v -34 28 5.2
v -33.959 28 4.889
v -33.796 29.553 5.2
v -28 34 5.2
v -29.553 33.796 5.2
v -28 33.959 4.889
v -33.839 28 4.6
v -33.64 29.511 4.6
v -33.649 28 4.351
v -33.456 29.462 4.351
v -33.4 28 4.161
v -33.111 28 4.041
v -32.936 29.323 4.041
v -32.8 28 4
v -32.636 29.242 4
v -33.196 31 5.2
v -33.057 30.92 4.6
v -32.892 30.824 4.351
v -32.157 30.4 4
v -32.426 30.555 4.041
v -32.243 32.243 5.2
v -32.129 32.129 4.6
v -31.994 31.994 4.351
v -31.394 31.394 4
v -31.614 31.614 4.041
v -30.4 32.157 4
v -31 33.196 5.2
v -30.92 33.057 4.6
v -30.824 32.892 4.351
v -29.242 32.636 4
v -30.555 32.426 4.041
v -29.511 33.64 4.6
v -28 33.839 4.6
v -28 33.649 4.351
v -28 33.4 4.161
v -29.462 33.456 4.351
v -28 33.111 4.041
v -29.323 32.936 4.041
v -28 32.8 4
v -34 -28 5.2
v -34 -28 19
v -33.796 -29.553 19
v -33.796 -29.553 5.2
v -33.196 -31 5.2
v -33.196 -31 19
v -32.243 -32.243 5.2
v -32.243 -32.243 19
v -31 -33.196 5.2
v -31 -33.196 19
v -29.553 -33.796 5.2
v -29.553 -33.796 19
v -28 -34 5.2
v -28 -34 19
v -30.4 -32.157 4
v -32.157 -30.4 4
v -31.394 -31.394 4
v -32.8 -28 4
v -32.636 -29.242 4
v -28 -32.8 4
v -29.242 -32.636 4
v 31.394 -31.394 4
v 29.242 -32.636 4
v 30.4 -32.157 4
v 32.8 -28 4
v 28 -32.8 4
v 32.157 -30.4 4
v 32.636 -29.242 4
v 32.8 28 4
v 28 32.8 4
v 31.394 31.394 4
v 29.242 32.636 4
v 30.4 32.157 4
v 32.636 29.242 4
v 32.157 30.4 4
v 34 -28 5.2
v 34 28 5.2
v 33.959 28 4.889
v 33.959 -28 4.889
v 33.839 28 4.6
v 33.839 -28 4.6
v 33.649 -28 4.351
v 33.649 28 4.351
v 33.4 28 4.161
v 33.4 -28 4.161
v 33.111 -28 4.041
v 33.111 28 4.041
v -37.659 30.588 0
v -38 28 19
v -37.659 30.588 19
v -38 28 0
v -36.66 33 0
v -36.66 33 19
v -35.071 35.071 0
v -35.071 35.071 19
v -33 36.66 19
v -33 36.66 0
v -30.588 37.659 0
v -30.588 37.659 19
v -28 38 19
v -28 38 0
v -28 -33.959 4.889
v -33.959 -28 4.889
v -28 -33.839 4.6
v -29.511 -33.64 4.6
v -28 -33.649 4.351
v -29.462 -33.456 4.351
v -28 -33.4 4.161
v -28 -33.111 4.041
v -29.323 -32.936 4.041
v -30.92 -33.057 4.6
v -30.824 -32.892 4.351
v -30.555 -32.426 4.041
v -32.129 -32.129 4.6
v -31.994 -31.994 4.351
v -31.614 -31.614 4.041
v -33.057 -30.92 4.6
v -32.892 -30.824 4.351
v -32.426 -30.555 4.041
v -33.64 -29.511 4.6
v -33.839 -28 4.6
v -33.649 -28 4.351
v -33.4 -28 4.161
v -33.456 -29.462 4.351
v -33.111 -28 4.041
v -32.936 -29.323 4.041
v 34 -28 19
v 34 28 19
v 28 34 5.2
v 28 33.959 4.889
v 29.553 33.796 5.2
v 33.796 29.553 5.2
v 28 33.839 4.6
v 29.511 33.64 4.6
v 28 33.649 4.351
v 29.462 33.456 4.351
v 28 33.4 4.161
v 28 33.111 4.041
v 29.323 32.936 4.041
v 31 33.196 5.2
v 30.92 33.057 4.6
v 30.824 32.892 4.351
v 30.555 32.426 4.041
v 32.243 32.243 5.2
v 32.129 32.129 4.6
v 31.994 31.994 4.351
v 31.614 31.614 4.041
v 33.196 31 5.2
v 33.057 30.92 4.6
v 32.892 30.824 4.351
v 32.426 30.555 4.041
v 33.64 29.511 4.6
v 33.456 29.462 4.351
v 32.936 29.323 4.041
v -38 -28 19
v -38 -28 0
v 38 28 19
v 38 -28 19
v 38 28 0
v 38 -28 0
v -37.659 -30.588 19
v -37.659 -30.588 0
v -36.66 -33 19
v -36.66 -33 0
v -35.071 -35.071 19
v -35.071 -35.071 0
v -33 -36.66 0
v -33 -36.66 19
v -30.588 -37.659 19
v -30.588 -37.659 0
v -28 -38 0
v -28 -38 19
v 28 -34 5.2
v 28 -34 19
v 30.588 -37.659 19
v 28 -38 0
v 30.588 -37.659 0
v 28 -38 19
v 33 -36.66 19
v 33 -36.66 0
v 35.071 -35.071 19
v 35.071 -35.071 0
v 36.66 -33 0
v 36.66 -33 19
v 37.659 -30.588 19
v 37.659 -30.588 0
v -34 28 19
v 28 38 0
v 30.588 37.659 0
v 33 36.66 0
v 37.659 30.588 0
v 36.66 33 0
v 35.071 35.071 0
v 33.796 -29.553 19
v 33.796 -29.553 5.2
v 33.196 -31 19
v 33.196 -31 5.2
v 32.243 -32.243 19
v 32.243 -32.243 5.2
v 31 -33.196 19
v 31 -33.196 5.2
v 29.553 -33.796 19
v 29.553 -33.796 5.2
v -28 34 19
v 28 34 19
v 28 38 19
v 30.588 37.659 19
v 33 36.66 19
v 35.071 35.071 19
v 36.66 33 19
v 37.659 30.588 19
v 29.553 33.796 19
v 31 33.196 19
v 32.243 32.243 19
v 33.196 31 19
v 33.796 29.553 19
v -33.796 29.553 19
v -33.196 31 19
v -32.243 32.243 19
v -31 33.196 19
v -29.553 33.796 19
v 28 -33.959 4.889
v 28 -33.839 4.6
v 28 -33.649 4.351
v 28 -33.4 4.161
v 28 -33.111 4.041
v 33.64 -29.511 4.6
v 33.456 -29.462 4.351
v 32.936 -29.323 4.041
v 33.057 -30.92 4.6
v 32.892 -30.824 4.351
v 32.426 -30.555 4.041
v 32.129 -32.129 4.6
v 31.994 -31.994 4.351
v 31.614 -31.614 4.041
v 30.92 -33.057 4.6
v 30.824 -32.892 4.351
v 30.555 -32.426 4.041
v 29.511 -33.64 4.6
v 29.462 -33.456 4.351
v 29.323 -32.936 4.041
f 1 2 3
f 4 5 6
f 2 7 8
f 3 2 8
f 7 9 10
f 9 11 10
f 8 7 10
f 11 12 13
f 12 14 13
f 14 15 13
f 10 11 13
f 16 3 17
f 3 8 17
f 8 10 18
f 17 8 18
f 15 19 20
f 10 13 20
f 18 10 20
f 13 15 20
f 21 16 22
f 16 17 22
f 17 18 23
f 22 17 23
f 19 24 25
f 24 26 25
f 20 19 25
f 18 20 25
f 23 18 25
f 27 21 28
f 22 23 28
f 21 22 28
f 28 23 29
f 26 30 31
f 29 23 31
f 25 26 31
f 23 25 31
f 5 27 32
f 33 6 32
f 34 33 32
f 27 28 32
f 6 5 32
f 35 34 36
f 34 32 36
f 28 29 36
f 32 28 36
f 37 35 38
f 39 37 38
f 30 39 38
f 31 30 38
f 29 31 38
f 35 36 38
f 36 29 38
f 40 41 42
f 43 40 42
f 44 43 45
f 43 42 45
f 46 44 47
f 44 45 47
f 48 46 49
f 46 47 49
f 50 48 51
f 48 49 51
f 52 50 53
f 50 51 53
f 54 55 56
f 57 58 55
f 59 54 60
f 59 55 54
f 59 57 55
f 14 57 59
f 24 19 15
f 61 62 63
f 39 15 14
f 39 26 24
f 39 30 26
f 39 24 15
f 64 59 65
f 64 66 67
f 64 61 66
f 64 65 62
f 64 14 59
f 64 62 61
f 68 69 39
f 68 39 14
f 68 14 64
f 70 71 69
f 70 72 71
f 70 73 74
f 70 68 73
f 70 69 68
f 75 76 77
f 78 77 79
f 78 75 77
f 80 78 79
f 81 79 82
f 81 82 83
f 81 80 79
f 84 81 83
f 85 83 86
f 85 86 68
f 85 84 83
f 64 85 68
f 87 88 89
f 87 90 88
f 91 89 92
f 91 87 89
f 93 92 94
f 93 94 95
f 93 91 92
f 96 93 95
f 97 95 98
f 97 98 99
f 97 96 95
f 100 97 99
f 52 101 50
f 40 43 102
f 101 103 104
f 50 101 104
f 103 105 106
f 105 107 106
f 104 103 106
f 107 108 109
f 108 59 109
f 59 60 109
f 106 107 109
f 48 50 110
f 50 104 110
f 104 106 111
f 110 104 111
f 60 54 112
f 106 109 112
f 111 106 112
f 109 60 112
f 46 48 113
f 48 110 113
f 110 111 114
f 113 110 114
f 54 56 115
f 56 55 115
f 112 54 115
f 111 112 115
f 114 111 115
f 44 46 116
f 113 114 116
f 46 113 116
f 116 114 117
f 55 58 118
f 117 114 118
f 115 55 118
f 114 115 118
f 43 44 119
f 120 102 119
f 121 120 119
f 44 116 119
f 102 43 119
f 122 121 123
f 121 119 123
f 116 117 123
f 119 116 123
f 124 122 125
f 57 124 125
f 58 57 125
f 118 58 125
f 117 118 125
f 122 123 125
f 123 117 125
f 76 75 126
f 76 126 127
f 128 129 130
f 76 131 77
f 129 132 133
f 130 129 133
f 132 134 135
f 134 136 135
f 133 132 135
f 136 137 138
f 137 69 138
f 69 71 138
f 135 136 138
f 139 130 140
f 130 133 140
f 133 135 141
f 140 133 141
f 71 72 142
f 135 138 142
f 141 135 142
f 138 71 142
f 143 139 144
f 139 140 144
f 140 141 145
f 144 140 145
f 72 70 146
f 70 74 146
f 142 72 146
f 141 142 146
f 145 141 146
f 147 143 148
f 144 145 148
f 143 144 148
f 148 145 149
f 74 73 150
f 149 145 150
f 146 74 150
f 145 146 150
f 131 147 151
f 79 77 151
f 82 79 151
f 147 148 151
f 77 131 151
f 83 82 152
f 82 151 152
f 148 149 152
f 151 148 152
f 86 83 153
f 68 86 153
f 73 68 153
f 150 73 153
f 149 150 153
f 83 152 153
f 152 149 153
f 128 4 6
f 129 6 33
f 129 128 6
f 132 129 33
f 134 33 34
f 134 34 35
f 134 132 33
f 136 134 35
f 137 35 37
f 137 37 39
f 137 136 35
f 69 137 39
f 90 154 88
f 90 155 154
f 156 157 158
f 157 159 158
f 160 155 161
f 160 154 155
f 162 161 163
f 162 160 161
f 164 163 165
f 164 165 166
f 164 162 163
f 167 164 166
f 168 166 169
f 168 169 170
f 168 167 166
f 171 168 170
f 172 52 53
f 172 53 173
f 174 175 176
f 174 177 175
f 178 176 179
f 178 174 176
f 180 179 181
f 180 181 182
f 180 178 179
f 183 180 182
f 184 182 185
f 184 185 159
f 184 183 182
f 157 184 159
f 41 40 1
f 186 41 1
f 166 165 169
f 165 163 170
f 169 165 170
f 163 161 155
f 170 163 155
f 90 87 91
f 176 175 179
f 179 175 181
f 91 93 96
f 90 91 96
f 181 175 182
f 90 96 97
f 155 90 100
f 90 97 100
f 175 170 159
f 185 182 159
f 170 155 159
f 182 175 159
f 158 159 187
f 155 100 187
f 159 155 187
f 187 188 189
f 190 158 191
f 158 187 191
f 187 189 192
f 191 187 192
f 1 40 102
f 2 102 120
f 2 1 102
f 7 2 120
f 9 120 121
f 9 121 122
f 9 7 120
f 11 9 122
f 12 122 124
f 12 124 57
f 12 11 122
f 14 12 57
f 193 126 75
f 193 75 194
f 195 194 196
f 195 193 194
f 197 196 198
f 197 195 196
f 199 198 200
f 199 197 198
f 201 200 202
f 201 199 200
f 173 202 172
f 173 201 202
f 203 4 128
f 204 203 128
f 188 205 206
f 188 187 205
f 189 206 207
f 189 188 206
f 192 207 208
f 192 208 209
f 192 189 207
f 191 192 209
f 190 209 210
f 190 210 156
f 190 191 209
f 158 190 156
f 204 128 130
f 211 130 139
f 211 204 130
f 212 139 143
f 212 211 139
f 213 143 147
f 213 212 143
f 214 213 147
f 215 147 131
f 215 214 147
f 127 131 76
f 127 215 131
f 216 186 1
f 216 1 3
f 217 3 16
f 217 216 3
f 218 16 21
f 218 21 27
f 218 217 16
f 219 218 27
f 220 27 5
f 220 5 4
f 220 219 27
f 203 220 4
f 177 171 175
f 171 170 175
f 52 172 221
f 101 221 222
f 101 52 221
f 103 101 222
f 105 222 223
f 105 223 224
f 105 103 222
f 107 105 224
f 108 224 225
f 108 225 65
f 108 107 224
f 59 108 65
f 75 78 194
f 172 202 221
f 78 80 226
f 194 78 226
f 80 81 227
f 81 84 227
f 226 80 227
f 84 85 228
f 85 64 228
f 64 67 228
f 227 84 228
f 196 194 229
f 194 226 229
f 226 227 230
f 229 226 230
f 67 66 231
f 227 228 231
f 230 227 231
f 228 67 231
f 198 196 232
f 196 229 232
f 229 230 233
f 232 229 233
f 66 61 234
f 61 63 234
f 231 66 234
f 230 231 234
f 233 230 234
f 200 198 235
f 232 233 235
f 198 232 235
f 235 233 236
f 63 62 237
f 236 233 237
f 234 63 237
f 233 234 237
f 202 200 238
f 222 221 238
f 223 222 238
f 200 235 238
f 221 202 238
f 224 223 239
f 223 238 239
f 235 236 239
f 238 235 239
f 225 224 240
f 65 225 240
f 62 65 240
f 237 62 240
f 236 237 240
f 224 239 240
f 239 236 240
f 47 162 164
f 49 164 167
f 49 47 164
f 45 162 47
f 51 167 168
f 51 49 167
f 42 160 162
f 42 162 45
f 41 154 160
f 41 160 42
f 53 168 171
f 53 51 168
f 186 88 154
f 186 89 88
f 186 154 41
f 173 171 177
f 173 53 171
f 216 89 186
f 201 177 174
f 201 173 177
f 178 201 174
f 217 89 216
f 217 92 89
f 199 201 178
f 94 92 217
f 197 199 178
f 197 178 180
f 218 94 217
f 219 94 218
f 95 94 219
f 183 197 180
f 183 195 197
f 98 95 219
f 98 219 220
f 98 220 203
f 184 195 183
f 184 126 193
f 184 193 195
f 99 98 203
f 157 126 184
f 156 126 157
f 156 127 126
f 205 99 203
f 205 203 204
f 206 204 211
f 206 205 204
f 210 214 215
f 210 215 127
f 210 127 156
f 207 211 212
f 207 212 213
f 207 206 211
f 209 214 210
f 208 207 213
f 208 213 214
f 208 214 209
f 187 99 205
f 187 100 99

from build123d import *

# Parameters (mm, degrees)
F0_W     = 76
F0_H     = 76
F0_W_2   = 68
F0_H_2   = 68
F1_DEPTH = 4
F2_DEPTH = 19
F3_R     = 6
F4_R     = 10
F5_R     = 1.2


with BuildPart() as f1:
    # F0 (on Top) → F1 (new body)
    with BuildSketch(Plane.XY):
        Rectangle(F0_W, F0_H)
        Rectangle(F0_W_2, F0_H_2, mode=Mode.SUBTRACT)
        Rectangle(F0_W_2, F0_H_2)
    extrude(amount=F1_DEPTH)

    # F0 (on Top) → F2 (join)
    with BuildSketch(Plane.XY):
        Rectangle(F0_W, F0_H)
        Rectangle(F0_W_2, F0_H_2, mode=Mode.SUBTRACT)
    extrude(amount=F2_DEPTH)

    # F3
    f3_edges = [f1.edges().sort_by_distance(p)[0] for p in [
        (34, 34, 11.5),
        (34, -34, 11.5),
        (-34, -34, 11.5),
        (-34, 34, 11.5),
    ]]
    fillet(f3_edges, radius=F3_R)

    # F4
    f4_edges = [f1.edges().sort_by_distance(p)[0] for p in [
        (-38, -38, 9.5),
        (38, -38, 9.5),
        (38, 38, 9.5),
        (-38, 38, 9.5),
    ]]
    fillet(f4_edges, radius=F4_R)

    # F5
    f5_edges = [f1.edges().sort_by_distance(p)[0] for p in [
        (34, 0, 4),
    ]]
    fillet(f5_edges, radius=F5_R)


solid = f1.part
